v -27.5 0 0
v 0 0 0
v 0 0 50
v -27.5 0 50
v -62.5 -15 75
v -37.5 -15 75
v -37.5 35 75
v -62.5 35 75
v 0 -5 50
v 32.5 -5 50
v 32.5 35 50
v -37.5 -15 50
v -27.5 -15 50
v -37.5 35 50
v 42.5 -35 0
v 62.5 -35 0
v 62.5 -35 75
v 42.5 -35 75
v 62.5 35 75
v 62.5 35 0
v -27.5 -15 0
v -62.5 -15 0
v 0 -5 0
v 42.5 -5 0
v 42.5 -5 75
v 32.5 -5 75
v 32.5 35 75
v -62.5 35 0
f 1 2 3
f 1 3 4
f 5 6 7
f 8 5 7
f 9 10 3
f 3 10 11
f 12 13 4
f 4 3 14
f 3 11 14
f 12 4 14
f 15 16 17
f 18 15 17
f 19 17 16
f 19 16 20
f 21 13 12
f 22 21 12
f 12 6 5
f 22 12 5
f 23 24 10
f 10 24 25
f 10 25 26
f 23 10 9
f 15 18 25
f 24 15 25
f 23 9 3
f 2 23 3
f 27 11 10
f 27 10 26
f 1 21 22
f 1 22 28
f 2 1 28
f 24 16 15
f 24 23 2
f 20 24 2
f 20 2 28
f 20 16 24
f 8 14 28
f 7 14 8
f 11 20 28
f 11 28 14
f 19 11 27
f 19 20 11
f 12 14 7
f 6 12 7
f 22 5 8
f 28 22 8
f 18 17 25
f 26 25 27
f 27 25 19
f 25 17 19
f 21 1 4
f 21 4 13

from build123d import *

# Parameters (mm, degrees)
F0_W     = 70
F0_H     = 75
F1_DEPTH = 62.5
F3_DEPTH = 75.001
F4_W     = 70
F4_H     = 25
F5_DEPTH = 70.001


with BuildPart() as f1:
    # F0 (on Right) → F1 (new body, symmetric)
    with BuildSketch(Plane.YZ):
        with Locations((0, 37.5)):
            Rectangle(F0_W, F0_H)
    extrude(amount=F1_DEPTH, both=True)

    # F2 (on face) → F3 (cut, through all)
    with BuildSketch(Plane.XY.offset(75)):
        Polygon((-62.5, -15), (-62.5, -35), (42.5, -35), (42.5, -5), (0, -5), (0, 0), (-27.5, 0), (-27.5, -15), align=None)
    extrude(amount=-F3_DEPTH, mode=Mode.SUBTRACT)

    # F4 (on face) → F5 (cut, through all)
    with BuildSketch(Plane(origin=(0, 35, 0), x_dir=(-1, 0, 0), z_dir=(0, 1, 0))):
        with Locations((2.5, 62.5)):
            Rectangle(F4_W, F4_H)
    extrude(amount=-F5_DEPTH, mode=Mode.SUBTRACT)


solid = f1.part
